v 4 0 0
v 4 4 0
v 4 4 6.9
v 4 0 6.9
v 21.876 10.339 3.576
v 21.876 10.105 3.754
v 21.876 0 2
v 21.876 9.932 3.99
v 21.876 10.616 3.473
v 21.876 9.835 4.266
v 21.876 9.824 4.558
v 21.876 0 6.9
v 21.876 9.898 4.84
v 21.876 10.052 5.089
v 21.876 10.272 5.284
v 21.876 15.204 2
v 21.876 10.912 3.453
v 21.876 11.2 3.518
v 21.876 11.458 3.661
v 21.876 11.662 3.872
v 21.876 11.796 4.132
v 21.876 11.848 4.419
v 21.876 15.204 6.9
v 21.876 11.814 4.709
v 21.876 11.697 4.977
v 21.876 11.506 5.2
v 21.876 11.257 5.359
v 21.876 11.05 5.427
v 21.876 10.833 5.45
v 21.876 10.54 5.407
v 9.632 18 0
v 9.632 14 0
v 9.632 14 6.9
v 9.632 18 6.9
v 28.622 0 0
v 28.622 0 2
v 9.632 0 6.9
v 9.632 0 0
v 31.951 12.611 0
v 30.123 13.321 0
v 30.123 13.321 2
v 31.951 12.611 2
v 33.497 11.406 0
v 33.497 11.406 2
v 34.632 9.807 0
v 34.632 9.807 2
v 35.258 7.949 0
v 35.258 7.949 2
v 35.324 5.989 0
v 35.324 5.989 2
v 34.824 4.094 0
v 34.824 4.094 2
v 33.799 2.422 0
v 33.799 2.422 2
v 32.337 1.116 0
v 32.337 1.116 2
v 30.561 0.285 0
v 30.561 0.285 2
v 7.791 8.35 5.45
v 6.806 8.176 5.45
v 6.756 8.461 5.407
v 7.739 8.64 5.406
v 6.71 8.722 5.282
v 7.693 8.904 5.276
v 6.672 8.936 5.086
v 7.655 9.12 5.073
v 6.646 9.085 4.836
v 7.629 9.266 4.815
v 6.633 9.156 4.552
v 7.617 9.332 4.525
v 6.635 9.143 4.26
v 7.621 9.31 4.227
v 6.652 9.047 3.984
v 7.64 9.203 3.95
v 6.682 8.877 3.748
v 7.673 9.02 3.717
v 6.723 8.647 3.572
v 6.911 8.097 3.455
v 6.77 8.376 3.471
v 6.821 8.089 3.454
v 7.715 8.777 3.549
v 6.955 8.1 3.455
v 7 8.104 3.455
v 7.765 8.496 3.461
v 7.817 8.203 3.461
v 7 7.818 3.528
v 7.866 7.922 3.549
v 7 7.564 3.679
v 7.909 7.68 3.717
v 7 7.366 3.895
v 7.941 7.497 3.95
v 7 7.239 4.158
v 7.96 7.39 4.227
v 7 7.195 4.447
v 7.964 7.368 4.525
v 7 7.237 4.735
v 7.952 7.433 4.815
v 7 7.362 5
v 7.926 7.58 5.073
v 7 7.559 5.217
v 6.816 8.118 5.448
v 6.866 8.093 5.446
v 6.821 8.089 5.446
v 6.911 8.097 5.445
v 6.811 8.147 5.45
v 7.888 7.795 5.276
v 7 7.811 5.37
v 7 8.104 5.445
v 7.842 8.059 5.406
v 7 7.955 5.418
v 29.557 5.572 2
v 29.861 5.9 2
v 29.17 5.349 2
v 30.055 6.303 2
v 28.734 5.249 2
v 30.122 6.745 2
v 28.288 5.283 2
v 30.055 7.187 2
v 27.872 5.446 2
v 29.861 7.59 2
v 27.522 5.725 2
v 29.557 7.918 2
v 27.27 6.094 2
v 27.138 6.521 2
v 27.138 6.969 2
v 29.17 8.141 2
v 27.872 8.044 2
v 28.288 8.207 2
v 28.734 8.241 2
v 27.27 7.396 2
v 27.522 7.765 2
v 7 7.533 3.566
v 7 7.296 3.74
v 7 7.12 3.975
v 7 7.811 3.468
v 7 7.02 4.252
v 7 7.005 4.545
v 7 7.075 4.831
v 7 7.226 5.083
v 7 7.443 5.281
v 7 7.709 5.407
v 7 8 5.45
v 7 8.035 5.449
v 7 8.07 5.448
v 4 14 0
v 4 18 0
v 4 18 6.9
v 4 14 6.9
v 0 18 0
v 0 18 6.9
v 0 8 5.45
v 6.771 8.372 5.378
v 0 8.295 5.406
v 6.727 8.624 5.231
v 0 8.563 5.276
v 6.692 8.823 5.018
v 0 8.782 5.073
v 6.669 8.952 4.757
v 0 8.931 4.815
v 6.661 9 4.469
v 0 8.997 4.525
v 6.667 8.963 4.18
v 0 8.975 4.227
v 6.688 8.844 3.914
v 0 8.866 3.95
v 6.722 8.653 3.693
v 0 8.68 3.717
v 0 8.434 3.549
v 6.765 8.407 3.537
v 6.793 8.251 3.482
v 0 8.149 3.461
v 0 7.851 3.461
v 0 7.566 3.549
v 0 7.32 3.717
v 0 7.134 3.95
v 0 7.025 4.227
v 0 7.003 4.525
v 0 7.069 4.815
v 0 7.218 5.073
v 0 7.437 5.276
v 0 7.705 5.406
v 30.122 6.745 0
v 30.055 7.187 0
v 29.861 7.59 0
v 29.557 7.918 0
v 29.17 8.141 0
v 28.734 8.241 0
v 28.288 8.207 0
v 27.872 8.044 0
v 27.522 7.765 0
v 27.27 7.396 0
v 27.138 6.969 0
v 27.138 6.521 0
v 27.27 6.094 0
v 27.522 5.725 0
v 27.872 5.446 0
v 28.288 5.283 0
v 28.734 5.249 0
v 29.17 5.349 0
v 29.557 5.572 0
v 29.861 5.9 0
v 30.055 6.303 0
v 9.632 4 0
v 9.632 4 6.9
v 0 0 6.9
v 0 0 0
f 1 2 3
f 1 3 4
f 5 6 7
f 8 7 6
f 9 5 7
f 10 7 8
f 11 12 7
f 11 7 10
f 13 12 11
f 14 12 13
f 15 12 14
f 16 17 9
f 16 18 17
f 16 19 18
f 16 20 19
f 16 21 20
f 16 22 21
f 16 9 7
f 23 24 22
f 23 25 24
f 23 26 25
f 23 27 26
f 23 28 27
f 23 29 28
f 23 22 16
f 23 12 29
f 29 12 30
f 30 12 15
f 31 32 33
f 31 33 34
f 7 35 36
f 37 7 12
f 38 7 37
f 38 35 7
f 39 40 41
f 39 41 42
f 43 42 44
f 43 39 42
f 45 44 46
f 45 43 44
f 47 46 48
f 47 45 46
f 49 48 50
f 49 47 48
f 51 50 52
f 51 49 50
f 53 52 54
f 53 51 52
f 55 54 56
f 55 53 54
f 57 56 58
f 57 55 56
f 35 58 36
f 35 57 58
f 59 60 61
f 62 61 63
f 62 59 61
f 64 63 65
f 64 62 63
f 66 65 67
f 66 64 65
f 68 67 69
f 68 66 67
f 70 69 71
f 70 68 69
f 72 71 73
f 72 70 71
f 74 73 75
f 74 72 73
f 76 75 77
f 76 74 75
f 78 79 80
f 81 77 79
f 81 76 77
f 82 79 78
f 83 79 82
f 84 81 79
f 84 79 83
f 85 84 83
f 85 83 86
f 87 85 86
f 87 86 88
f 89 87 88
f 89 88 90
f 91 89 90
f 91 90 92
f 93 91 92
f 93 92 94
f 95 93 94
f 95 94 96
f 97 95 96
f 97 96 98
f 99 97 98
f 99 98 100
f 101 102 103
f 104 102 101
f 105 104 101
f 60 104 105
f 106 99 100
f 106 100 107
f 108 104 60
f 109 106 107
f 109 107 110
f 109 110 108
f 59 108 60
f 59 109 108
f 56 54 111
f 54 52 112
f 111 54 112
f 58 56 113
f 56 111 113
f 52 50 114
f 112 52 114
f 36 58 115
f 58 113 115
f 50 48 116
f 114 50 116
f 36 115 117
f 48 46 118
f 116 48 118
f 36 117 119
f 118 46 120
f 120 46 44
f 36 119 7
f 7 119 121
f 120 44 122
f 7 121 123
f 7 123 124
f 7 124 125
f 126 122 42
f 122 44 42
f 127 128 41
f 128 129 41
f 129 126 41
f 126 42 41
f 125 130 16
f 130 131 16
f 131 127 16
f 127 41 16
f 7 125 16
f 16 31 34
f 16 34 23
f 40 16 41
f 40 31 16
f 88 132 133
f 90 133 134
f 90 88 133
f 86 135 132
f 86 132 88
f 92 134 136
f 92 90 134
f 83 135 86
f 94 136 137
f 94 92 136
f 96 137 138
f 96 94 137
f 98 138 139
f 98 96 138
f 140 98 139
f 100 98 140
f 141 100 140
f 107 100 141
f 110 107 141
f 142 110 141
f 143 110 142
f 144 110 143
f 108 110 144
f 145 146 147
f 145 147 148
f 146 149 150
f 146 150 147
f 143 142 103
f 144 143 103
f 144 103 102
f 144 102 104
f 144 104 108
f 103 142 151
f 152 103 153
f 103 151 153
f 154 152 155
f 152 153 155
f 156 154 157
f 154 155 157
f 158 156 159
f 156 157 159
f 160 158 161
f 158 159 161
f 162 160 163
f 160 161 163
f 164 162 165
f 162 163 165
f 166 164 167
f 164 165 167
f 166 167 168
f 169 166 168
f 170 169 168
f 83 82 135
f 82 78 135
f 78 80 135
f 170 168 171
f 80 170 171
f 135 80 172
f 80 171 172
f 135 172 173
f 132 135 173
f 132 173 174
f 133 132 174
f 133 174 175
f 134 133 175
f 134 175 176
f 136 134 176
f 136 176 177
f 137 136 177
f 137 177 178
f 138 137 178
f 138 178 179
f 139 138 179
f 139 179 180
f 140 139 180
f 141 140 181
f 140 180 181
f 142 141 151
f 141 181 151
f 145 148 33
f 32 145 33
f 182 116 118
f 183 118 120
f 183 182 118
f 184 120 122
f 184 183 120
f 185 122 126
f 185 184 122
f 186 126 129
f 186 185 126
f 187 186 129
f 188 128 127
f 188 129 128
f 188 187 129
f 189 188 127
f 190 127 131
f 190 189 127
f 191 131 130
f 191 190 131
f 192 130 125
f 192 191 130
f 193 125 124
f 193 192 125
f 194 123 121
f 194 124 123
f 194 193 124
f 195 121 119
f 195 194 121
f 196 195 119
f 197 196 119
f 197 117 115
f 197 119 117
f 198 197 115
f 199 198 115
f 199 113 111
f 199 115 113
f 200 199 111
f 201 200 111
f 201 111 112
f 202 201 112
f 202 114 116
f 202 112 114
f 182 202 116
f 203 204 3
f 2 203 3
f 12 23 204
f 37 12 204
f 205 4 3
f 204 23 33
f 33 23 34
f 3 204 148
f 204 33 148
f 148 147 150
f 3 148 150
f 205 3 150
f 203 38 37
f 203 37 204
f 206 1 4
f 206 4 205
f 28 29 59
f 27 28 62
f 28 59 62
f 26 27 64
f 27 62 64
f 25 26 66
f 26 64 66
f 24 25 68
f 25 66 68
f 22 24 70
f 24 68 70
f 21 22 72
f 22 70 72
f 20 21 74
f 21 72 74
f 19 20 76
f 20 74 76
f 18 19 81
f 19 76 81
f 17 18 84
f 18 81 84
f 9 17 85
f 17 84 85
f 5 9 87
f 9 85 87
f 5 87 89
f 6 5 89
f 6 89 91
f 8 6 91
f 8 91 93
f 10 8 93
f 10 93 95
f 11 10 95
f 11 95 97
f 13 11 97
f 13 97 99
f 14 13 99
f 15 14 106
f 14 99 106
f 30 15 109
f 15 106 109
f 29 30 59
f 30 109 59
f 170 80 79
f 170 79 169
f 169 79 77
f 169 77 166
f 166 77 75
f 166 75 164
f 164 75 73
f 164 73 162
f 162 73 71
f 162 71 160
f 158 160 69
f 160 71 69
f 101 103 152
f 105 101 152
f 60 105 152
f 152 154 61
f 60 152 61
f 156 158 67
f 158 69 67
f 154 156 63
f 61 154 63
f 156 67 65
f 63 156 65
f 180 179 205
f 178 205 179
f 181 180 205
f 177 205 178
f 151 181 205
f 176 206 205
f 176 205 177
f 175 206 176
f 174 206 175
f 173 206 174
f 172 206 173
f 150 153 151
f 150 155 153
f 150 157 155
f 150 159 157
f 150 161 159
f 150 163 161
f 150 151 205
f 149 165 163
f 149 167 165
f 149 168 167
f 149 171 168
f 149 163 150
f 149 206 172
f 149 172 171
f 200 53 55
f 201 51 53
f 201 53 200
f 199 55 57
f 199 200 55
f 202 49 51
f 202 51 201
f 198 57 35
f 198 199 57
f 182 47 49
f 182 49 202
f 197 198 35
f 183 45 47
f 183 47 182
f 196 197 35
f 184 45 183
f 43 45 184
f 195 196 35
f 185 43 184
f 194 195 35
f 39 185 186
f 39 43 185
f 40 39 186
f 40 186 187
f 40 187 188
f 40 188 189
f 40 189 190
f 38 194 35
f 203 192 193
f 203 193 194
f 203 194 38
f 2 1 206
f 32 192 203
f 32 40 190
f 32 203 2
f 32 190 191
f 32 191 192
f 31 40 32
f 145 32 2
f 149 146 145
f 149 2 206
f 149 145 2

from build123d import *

# Parameters (mm, degrees)
SKETCH1_R               = 1.5
BOSS_EXTRUDE1_DEPTH     = 6.9
CUT_EXTRUDE2_START      = -4.9
CUT_EXTRUDE2_DEPTH      = 4.9
SKETCH5_R               = 1
CUT_EXTRUDE3_DEPTH      = 7
CUT_EXTRUDE4_DEPTH      = 1
CUT_EXTRUDE4_DEPTH_BACK = 32.830268668
SKETCH7_R               = 1


with BuildPart() as part:
    # Sketch1 → Boss-Extrude1 (new body)
    with BuildSketch(Plane.XY):
        with BuildLine():
            Line((0, 0), (0, 18.000341084))
            Line((0, 18.000341084), (4, 18.000341084))
            Line((4, 18.000341084), (4, 14.000341084))
            Line((4, 14.000341084), (9.631516349, 14.000341084))
            Line((9.631516349, 14.000341084), (9.631516349, 18.000341084))
            Line((9.631516349, 18.000341084), (30.123176491, 13.320805491))
            ThreePointArc((30.123176491, 13.320805491), (35.324106187, 5.989458303), (28.621516349, 0))
            Line((28.621516349, 0), (9.631516349, 0))
            Line((9.631516349, 0), (9.631516349, 4))
            Line((9.631516349, 4), (4, 4))
            Line((4, 4), (4, 0))
            Line((4, 0), (0, 0))
        make_face()
        with Locations((28.621516349, 6.745044143)):
            Circle(SKETCH1_R, mode=Mode.SUBTRACT)
    extrude(amount=BOSS_EXTRUDE1_DEPTH)

    # Sketch4 → Cut-Extrude2 (cut)
    with BuildSketch(Plane.XY.offset(6.9).offset(CUT_EXTRUDE2_START)):
        with BuildLine():
            Line((21.876472206, 0), (21.876472206, 15.204047061))
            Line((21.876472206, 15.204047061), (30.123176491, 13.320805491))
            ThreePointArc((30.123176491, 13.320805491), (35.324106187, 5.989458303), (28.621516349, 0))
            Line((28.621516349, 0), (21.876472206, 0))
        make_face()
    extrude(amount=CUT_EXTRUDE2_DEPTH, mode=Mode.SUBTRACT)

    # Sketch5 → Cut-Extrude3 (cut)
    with BuildSketch(Plane.ZY):
        with Locations((4.45, 8)):
            Circle(SKETCH5_R)
    extrude(amount=-CUT_EXTRUDE3_DEPTH, mode=Mode.SUBTRACT)

    # Sketch7 → Cut-Extrude4 (cut, two sides: drawn at the far end of the back side and taken through both)
    with BuildSketch(Plane(origin=(8.983585976, 1.584048591, 0), x_dir=(0, 0, 1), z_dir=(-0.9848077530122079, -0.17364817766693139, 0)).offset(-CUT_EXTRUDE4_DEPTH_BACK)):
        with Locations((4.45, 6.87)):
            Circle(SKETCH7_R)
    extrude(amount=CUT_EXTRUDE4_DEPTH + CUT_EXTRUDE4_DEPTH_BACK, mode=Mode.SUBTRACT)


solid = part.part
